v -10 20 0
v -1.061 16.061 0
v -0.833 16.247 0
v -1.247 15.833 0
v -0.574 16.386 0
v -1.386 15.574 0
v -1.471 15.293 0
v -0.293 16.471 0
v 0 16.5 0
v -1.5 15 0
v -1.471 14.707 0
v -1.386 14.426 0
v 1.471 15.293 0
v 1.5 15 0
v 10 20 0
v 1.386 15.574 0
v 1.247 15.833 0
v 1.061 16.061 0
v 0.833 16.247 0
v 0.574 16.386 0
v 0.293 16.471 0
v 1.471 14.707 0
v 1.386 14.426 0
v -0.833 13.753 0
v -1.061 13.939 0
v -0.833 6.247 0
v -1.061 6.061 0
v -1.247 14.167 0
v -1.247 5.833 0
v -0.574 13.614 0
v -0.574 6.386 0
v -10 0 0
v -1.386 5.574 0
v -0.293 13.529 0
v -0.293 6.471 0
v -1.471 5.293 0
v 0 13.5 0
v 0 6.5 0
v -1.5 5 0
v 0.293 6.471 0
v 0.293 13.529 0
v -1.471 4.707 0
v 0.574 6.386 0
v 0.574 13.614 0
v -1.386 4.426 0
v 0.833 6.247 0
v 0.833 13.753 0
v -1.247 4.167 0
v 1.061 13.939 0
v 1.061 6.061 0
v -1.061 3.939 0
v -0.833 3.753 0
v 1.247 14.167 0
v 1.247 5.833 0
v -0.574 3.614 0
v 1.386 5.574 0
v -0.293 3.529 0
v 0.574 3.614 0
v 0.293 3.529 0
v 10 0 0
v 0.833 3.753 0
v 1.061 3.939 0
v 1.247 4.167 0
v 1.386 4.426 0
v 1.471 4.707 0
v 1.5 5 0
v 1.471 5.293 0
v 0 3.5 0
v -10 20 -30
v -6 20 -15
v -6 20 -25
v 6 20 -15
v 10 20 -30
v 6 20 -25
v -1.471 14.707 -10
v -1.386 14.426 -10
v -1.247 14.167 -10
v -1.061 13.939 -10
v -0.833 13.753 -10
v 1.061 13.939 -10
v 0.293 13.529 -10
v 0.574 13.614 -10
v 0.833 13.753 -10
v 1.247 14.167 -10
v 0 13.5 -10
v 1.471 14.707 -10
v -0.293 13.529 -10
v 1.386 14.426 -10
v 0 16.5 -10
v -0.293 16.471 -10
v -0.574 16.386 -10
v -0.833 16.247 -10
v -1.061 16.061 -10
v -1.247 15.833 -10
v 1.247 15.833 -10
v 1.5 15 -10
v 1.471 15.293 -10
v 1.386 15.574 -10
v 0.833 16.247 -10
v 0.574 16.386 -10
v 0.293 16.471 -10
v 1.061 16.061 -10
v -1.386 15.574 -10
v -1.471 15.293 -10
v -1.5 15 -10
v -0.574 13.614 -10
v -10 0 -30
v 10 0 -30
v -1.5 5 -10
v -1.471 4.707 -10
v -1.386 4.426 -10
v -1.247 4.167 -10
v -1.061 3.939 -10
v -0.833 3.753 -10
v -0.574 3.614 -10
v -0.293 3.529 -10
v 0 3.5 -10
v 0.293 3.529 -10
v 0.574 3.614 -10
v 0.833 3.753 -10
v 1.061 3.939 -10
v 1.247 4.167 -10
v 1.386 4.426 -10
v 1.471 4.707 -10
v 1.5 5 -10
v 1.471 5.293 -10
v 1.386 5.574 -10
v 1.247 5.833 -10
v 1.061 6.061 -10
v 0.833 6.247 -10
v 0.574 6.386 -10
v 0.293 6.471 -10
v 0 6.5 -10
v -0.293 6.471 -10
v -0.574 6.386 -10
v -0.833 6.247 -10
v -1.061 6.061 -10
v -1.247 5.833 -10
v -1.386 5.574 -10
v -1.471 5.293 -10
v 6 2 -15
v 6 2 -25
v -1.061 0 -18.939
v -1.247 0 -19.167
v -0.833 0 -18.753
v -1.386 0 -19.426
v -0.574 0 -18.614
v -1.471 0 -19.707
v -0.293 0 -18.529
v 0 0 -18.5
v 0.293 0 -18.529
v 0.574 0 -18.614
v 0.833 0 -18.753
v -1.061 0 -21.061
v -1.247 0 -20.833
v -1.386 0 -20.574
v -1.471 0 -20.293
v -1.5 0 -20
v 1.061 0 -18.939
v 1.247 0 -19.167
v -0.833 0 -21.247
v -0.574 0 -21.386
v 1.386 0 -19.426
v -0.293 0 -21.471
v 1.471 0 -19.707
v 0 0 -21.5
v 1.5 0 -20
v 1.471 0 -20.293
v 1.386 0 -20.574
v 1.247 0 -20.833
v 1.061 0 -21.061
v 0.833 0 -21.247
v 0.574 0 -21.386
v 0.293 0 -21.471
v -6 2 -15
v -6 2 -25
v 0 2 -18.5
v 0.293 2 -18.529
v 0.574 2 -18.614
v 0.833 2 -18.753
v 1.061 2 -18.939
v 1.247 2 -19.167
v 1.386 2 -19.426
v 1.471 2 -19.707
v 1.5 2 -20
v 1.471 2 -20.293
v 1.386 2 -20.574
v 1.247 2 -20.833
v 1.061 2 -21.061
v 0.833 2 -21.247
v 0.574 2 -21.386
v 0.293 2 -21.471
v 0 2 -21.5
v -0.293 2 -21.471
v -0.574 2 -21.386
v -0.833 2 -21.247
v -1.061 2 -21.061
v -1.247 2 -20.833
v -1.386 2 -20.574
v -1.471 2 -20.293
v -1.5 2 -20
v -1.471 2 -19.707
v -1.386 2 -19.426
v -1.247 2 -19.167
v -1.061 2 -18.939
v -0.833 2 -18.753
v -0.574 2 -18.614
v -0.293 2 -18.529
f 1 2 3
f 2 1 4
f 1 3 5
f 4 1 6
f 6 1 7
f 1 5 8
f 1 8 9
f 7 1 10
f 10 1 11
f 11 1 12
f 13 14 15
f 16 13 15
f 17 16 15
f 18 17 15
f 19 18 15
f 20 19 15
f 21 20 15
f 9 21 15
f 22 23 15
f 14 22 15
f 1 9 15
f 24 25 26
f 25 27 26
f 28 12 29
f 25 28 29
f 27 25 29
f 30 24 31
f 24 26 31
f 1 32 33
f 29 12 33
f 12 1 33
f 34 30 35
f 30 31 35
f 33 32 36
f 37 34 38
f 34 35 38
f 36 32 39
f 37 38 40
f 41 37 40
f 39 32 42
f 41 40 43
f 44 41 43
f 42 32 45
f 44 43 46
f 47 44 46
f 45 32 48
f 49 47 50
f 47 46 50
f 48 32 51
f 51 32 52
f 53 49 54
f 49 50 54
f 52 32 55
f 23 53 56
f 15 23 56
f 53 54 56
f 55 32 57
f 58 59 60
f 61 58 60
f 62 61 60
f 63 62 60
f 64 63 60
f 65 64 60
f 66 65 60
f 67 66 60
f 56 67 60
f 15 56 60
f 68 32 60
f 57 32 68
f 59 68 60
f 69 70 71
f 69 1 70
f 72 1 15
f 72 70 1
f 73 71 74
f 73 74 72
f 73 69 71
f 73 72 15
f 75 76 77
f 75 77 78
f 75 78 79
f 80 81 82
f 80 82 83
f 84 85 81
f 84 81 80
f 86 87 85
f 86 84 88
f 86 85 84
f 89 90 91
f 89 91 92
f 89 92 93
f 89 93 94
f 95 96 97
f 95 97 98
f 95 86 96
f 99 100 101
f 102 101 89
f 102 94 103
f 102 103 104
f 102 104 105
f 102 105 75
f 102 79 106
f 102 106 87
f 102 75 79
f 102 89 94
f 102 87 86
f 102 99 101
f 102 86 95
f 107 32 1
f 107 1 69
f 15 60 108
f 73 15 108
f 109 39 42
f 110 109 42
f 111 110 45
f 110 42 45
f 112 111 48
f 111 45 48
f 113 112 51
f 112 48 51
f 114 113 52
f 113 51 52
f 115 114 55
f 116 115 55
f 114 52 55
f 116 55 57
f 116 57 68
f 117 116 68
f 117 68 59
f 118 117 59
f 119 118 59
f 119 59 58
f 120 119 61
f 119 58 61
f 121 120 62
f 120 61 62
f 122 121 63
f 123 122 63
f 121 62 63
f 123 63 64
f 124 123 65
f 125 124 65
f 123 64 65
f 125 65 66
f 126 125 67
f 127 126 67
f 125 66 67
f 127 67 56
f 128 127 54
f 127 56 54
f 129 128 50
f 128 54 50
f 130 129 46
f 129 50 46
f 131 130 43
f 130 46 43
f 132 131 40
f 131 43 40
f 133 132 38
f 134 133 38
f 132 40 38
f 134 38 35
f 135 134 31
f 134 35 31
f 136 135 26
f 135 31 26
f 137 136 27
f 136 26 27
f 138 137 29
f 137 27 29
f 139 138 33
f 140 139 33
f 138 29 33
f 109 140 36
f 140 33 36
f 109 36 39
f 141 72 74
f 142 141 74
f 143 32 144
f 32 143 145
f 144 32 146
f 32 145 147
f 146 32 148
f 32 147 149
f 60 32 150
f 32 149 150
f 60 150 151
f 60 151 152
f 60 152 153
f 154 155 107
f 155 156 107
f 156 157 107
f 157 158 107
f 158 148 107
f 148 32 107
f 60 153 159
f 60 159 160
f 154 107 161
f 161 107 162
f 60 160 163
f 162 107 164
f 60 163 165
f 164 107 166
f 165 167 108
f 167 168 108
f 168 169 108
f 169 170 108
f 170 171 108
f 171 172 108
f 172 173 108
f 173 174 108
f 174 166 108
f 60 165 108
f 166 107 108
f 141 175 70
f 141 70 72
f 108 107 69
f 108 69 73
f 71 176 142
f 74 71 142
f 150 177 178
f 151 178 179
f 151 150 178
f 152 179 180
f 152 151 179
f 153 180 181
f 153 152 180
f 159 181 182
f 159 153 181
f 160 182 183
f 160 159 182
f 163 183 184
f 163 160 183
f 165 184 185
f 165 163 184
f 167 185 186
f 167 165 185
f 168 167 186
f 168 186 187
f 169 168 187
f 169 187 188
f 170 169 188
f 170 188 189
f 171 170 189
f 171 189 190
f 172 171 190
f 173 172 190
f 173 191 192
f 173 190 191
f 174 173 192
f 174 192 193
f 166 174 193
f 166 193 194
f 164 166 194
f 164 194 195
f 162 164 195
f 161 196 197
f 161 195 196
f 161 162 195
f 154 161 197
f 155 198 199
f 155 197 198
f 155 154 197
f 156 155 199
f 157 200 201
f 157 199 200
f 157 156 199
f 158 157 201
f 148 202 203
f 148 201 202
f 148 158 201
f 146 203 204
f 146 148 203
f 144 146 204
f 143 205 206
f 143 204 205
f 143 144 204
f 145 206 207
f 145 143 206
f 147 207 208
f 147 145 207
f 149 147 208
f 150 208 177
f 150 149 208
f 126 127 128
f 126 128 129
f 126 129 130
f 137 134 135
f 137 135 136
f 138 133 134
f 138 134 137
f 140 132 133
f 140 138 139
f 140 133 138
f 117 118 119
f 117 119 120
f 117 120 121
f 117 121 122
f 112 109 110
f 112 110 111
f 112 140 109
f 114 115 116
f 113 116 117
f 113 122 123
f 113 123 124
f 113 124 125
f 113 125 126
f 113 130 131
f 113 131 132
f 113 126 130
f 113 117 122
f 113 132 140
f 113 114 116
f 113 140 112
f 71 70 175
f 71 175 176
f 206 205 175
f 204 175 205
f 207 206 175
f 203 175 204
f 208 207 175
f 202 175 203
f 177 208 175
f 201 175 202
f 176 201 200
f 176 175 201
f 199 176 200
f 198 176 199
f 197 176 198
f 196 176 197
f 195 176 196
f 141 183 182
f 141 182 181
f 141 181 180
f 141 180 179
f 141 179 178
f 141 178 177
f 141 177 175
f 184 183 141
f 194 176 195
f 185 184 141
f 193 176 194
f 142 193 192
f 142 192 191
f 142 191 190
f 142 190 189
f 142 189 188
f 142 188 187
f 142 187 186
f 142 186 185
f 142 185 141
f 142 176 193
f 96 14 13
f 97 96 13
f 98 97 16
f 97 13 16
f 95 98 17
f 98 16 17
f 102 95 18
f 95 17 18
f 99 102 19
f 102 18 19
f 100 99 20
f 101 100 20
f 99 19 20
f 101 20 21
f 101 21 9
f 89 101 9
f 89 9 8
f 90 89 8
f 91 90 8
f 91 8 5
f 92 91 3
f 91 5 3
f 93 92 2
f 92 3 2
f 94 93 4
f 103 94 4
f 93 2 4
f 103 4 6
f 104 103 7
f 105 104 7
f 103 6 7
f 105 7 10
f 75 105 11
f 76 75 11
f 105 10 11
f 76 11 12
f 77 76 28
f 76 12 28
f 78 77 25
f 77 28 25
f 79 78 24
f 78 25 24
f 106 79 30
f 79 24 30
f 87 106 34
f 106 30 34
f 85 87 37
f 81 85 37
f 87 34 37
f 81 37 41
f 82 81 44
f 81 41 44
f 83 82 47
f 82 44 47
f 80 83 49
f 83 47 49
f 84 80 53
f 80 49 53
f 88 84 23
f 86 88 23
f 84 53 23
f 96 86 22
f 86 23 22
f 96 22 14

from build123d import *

# Parameters (mm, degrees)
SKETCH1_W           = 20
SKETCH1_H           = 30
BOSS_EXTRUDE1_DEPTH = 20
SKETCH4_W           = 12
SKETCH4_H           = 10
CUT_EXTRUDE2_DEPTH  = 18
SKETCH3_R           = 1.5
CUT_EXTRUDE3_DEPTH  = 38.416573868
SKETCH5_R           = 1.5
CUT_EXTRUDE4_DEPTH  = 10


with BuildPart() as part:
    # Sketch1 → Boss-Extrude1 (new body)
    with BuildSketch(Plane(origin=(0, 0, 0), x_dir=(1, 0, 0), z_dir=(0, 1, 0))):
        with Locations((0, 15)):
            Rectangle(SKETCH1_W, SKETCH1_H)
    extrude(amount=BOSS_EXTRUDE1_DEPTH)

    # Sketch4 → Cut-Extrude2 (cut)
    with BuildSketch(Plane(origin=(0, 20, 0), x_dir=(1, 0, 0), z_dir=(0, 1, 0))):
        with Locations((0, 20)):
            Rectangle(SKETCH4_W, SKETCH4_H)
    extrude(amount=-CUT_EXTRUDE2_DEPTH, mode=Mode.SUBTRACT)

    # Sketch3 → Cut-Extrude3 (cut, through all)
    with BuildSketch(Plane(origin=(0, 0, 0), x_dir=(1, 0, 0), z_dir=(0, 1, 0))):
        with Locations(Location((0, 20, 0), (0, 0, 270))):
            Circle(SKETCH3_R)
    extrude(amount=CUT_EXTRUDE3_DEPTH, mode=Mode.SUBTRACT)

    # Sketch5 → Cut-Extrude4 (cut)
    with BuildSketch(Plane.XY):
        with Locations((0, 15)):
            Circle(SKETCH5_R)
        with Locations(Location((0, 5, 0), (0, 0, 180))):
            Circle(SKETCH5_R)
    extrude(amount=-CUT_EXTRUDE4_DEPTH, mode=Mode.SUBTRACT)


solid = part.part
